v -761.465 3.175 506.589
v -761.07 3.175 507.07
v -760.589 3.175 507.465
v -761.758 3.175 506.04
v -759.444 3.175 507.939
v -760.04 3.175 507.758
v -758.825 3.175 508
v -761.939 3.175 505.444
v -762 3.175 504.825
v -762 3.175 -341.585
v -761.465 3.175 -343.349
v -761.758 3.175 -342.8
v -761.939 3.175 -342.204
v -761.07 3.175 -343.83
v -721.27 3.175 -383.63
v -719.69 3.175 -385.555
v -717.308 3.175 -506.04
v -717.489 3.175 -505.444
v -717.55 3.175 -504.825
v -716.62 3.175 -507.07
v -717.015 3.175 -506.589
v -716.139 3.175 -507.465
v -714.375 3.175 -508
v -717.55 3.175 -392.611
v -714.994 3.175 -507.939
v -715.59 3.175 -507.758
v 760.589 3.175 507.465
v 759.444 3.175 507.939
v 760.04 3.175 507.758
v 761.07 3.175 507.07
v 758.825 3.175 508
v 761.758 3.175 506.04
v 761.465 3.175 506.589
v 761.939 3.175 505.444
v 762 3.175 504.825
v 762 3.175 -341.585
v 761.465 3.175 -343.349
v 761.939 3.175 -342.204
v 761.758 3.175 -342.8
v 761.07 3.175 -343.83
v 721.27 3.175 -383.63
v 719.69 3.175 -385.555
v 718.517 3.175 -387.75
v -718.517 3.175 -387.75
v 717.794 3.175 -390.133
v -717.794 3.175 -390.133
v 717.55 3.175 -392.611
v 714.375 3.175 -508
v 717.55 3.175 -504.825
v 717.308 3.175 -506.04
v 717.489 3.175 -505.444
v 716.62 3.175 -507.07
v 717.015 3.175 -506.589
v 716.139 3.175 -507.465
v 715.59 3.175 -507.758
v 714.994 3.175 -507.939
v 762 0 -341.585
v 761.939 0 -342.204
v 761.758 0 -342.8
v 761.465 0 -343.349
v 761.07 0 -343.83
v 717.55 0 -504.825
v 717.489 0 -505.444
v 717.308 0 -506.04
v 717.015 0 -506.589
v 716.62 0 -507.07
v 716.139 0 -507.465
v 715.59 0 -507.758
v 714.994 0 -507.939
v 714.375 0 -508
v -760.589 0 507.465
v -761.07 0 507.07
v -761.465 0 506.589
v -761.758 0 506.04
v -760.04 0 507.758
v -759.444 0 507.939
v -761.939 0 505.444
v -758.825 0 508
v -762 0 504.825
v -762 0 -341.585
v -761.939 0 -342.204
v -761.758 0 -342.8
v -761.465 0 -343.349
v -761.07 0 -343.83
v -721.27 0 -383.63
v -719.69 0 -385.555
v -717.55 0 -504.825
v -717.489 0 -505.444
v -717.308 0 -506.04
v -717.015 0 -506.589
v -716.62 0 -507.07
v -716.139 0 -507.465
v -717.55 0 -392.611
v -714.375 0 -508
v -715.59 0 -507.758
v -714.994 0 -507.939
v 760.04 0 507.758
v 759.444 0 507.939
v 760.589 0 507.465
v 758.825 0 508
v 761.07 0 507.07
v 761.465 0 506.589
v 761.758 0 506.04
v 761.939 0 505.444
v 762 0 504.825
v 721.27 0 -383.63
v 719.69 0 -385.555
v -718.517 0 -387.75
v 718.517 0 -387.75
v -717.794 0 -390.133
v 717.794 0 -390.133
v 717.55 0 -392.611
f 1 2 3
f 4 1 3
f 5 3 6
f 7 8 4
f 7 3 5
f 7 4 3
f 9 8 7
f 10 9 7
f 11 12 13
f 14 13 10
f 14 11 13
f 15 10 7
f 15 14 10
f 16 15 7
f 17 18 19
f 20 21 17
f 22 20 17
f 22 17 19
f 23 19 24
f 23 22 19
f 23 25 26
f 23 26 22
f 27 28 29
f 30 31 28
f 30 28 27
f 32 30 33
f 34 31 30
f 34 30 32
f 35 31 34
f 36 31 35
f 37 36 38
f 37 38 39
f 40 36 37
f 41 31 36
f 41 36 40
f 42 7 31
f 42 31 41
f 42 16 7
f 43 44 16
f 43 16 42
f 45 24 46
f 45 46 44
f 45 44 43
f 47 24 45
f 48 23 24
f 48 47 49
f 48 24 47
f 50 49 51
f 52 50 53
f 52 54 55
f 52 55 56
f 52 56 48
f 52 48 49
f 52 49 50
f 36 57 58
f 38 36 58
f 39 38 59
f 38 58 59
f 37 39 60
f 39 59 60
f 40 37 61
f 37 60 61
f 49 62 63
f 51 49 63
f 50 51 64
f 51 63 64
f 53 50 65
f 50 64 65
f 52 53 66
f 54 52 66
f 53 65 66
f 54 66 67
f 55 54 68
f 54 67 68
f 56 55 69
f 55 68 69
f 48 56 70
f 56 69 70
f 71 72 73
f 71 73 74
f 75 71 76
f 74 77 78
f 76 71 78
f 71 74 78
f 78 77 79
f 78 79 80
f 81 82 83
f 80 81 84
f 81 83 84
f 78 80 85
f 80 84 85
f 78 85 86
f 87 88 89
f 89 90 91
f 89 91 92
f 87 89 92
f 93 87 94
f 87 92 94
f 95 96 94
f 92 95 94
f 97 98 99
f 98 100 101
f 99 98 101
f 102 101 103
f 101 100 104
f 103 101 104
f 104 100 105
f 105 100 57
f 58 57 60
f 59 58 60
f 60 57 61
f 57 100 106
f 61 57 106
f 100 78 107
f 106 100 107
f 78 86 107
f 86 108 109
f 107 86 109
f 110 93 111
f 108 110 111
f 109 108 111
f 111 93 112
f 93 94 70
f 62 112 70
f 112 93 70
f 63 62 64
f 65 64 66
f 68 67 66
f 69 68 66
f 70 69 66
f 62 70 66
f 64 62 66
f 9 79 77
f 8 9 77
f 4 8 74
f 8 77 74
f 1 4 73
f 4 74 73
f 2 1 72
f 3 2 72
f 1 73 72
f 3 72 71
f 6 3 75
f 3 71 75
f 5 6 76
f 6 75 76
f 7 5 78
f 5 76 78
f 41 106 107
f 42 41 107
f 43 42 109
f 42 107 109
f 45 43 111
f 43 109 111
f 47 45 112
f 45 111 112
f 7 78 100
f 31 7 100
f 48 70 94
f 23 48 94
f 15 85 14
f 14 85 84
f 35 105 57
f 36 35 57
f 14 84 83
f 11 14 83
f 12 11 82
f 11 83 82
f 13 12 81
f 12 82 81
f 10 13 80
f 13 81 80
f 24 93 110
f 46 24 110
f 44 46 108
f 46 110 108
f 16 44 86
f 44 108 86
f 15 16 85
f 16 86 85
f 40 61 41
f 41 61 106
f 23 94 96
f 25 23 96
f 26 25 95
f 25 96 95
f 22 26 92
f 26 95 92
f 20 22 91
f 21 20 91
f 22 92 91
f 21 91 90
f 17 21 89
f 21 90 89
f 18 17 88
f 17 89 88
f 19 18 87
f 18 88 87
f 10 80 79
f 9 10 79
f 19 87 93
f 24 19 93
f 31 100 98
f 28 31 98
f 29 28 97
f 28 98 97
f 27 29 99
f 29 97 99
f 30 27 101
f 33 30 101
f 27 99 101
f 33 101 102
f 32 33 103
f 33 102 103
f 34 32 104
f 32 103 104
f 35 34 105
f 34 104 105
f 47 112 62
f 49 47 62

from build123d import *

# Parameters (mm, degrees)
BOSS_EXTRUDE1_DEPTH = 3.175


with BuildPart() as part:
    # Sketch1 → Boss-Extrude1 (new body)
    with BuildSketch(Plane(origin=(0, 0, 0), x_dir=(1, 0, 0), z_dir=(0, 1, 0))):
        with BuildLine():
            Line((-717.55, 504.825), (-717.55, 392.610512242))
            ThreePointArc((-717.55, 392.610512242), (-718.516729937, 387.750432651), (-721.269743879, 383.630256121))
            Line((-721.269743879, 383.630256121), (-761.07006403, 343.82993597))
            ThreePointArc((-761.07006403, 343.82993597), (-761.758317516, 342.799891837), (-762, 341.584871939))
            Line((-762, 341.584871939), (-762, -504.825))
            ThreePointArc((-762, -504.825), (-761.07006403, -507.07006403), (-758.825, -508))
            Line((-758.825, -508), (758.825, -508))
            ThreePointArc((758.825, -508), (761.07006403, -507.07006403), (762, -504.825))
            Line((762, -504.825), (762, 341.584871939))
            ThreePointArc((762, 341.584871939), (761.758317516, 342.799891837), (761.07006403, 343.82993597))
            Line((761.07006403, 343.82993597), (721.269743879, 383.630256121))
            ThreePointArc((721.269743879, 383.630256121), (718.516729937, 387.750432651), (717.55, 392.610512242))
            Line((717.55, 392.610512242), (717.55, 504.825))
            ThreePointArc((717.55, 504.825), (716.62006403, 507.07006403), (714.375, 508))
            Line((714.375, 508), (-714.375, 508))
            ThreePointArc((-714.375, 508), (-716.62006403, 507.07006403), (-717.55, 504.825))
        make_face()
    extrude(amount=BOSS_EXTRUDE1_DEPTH)


solid = part.part
